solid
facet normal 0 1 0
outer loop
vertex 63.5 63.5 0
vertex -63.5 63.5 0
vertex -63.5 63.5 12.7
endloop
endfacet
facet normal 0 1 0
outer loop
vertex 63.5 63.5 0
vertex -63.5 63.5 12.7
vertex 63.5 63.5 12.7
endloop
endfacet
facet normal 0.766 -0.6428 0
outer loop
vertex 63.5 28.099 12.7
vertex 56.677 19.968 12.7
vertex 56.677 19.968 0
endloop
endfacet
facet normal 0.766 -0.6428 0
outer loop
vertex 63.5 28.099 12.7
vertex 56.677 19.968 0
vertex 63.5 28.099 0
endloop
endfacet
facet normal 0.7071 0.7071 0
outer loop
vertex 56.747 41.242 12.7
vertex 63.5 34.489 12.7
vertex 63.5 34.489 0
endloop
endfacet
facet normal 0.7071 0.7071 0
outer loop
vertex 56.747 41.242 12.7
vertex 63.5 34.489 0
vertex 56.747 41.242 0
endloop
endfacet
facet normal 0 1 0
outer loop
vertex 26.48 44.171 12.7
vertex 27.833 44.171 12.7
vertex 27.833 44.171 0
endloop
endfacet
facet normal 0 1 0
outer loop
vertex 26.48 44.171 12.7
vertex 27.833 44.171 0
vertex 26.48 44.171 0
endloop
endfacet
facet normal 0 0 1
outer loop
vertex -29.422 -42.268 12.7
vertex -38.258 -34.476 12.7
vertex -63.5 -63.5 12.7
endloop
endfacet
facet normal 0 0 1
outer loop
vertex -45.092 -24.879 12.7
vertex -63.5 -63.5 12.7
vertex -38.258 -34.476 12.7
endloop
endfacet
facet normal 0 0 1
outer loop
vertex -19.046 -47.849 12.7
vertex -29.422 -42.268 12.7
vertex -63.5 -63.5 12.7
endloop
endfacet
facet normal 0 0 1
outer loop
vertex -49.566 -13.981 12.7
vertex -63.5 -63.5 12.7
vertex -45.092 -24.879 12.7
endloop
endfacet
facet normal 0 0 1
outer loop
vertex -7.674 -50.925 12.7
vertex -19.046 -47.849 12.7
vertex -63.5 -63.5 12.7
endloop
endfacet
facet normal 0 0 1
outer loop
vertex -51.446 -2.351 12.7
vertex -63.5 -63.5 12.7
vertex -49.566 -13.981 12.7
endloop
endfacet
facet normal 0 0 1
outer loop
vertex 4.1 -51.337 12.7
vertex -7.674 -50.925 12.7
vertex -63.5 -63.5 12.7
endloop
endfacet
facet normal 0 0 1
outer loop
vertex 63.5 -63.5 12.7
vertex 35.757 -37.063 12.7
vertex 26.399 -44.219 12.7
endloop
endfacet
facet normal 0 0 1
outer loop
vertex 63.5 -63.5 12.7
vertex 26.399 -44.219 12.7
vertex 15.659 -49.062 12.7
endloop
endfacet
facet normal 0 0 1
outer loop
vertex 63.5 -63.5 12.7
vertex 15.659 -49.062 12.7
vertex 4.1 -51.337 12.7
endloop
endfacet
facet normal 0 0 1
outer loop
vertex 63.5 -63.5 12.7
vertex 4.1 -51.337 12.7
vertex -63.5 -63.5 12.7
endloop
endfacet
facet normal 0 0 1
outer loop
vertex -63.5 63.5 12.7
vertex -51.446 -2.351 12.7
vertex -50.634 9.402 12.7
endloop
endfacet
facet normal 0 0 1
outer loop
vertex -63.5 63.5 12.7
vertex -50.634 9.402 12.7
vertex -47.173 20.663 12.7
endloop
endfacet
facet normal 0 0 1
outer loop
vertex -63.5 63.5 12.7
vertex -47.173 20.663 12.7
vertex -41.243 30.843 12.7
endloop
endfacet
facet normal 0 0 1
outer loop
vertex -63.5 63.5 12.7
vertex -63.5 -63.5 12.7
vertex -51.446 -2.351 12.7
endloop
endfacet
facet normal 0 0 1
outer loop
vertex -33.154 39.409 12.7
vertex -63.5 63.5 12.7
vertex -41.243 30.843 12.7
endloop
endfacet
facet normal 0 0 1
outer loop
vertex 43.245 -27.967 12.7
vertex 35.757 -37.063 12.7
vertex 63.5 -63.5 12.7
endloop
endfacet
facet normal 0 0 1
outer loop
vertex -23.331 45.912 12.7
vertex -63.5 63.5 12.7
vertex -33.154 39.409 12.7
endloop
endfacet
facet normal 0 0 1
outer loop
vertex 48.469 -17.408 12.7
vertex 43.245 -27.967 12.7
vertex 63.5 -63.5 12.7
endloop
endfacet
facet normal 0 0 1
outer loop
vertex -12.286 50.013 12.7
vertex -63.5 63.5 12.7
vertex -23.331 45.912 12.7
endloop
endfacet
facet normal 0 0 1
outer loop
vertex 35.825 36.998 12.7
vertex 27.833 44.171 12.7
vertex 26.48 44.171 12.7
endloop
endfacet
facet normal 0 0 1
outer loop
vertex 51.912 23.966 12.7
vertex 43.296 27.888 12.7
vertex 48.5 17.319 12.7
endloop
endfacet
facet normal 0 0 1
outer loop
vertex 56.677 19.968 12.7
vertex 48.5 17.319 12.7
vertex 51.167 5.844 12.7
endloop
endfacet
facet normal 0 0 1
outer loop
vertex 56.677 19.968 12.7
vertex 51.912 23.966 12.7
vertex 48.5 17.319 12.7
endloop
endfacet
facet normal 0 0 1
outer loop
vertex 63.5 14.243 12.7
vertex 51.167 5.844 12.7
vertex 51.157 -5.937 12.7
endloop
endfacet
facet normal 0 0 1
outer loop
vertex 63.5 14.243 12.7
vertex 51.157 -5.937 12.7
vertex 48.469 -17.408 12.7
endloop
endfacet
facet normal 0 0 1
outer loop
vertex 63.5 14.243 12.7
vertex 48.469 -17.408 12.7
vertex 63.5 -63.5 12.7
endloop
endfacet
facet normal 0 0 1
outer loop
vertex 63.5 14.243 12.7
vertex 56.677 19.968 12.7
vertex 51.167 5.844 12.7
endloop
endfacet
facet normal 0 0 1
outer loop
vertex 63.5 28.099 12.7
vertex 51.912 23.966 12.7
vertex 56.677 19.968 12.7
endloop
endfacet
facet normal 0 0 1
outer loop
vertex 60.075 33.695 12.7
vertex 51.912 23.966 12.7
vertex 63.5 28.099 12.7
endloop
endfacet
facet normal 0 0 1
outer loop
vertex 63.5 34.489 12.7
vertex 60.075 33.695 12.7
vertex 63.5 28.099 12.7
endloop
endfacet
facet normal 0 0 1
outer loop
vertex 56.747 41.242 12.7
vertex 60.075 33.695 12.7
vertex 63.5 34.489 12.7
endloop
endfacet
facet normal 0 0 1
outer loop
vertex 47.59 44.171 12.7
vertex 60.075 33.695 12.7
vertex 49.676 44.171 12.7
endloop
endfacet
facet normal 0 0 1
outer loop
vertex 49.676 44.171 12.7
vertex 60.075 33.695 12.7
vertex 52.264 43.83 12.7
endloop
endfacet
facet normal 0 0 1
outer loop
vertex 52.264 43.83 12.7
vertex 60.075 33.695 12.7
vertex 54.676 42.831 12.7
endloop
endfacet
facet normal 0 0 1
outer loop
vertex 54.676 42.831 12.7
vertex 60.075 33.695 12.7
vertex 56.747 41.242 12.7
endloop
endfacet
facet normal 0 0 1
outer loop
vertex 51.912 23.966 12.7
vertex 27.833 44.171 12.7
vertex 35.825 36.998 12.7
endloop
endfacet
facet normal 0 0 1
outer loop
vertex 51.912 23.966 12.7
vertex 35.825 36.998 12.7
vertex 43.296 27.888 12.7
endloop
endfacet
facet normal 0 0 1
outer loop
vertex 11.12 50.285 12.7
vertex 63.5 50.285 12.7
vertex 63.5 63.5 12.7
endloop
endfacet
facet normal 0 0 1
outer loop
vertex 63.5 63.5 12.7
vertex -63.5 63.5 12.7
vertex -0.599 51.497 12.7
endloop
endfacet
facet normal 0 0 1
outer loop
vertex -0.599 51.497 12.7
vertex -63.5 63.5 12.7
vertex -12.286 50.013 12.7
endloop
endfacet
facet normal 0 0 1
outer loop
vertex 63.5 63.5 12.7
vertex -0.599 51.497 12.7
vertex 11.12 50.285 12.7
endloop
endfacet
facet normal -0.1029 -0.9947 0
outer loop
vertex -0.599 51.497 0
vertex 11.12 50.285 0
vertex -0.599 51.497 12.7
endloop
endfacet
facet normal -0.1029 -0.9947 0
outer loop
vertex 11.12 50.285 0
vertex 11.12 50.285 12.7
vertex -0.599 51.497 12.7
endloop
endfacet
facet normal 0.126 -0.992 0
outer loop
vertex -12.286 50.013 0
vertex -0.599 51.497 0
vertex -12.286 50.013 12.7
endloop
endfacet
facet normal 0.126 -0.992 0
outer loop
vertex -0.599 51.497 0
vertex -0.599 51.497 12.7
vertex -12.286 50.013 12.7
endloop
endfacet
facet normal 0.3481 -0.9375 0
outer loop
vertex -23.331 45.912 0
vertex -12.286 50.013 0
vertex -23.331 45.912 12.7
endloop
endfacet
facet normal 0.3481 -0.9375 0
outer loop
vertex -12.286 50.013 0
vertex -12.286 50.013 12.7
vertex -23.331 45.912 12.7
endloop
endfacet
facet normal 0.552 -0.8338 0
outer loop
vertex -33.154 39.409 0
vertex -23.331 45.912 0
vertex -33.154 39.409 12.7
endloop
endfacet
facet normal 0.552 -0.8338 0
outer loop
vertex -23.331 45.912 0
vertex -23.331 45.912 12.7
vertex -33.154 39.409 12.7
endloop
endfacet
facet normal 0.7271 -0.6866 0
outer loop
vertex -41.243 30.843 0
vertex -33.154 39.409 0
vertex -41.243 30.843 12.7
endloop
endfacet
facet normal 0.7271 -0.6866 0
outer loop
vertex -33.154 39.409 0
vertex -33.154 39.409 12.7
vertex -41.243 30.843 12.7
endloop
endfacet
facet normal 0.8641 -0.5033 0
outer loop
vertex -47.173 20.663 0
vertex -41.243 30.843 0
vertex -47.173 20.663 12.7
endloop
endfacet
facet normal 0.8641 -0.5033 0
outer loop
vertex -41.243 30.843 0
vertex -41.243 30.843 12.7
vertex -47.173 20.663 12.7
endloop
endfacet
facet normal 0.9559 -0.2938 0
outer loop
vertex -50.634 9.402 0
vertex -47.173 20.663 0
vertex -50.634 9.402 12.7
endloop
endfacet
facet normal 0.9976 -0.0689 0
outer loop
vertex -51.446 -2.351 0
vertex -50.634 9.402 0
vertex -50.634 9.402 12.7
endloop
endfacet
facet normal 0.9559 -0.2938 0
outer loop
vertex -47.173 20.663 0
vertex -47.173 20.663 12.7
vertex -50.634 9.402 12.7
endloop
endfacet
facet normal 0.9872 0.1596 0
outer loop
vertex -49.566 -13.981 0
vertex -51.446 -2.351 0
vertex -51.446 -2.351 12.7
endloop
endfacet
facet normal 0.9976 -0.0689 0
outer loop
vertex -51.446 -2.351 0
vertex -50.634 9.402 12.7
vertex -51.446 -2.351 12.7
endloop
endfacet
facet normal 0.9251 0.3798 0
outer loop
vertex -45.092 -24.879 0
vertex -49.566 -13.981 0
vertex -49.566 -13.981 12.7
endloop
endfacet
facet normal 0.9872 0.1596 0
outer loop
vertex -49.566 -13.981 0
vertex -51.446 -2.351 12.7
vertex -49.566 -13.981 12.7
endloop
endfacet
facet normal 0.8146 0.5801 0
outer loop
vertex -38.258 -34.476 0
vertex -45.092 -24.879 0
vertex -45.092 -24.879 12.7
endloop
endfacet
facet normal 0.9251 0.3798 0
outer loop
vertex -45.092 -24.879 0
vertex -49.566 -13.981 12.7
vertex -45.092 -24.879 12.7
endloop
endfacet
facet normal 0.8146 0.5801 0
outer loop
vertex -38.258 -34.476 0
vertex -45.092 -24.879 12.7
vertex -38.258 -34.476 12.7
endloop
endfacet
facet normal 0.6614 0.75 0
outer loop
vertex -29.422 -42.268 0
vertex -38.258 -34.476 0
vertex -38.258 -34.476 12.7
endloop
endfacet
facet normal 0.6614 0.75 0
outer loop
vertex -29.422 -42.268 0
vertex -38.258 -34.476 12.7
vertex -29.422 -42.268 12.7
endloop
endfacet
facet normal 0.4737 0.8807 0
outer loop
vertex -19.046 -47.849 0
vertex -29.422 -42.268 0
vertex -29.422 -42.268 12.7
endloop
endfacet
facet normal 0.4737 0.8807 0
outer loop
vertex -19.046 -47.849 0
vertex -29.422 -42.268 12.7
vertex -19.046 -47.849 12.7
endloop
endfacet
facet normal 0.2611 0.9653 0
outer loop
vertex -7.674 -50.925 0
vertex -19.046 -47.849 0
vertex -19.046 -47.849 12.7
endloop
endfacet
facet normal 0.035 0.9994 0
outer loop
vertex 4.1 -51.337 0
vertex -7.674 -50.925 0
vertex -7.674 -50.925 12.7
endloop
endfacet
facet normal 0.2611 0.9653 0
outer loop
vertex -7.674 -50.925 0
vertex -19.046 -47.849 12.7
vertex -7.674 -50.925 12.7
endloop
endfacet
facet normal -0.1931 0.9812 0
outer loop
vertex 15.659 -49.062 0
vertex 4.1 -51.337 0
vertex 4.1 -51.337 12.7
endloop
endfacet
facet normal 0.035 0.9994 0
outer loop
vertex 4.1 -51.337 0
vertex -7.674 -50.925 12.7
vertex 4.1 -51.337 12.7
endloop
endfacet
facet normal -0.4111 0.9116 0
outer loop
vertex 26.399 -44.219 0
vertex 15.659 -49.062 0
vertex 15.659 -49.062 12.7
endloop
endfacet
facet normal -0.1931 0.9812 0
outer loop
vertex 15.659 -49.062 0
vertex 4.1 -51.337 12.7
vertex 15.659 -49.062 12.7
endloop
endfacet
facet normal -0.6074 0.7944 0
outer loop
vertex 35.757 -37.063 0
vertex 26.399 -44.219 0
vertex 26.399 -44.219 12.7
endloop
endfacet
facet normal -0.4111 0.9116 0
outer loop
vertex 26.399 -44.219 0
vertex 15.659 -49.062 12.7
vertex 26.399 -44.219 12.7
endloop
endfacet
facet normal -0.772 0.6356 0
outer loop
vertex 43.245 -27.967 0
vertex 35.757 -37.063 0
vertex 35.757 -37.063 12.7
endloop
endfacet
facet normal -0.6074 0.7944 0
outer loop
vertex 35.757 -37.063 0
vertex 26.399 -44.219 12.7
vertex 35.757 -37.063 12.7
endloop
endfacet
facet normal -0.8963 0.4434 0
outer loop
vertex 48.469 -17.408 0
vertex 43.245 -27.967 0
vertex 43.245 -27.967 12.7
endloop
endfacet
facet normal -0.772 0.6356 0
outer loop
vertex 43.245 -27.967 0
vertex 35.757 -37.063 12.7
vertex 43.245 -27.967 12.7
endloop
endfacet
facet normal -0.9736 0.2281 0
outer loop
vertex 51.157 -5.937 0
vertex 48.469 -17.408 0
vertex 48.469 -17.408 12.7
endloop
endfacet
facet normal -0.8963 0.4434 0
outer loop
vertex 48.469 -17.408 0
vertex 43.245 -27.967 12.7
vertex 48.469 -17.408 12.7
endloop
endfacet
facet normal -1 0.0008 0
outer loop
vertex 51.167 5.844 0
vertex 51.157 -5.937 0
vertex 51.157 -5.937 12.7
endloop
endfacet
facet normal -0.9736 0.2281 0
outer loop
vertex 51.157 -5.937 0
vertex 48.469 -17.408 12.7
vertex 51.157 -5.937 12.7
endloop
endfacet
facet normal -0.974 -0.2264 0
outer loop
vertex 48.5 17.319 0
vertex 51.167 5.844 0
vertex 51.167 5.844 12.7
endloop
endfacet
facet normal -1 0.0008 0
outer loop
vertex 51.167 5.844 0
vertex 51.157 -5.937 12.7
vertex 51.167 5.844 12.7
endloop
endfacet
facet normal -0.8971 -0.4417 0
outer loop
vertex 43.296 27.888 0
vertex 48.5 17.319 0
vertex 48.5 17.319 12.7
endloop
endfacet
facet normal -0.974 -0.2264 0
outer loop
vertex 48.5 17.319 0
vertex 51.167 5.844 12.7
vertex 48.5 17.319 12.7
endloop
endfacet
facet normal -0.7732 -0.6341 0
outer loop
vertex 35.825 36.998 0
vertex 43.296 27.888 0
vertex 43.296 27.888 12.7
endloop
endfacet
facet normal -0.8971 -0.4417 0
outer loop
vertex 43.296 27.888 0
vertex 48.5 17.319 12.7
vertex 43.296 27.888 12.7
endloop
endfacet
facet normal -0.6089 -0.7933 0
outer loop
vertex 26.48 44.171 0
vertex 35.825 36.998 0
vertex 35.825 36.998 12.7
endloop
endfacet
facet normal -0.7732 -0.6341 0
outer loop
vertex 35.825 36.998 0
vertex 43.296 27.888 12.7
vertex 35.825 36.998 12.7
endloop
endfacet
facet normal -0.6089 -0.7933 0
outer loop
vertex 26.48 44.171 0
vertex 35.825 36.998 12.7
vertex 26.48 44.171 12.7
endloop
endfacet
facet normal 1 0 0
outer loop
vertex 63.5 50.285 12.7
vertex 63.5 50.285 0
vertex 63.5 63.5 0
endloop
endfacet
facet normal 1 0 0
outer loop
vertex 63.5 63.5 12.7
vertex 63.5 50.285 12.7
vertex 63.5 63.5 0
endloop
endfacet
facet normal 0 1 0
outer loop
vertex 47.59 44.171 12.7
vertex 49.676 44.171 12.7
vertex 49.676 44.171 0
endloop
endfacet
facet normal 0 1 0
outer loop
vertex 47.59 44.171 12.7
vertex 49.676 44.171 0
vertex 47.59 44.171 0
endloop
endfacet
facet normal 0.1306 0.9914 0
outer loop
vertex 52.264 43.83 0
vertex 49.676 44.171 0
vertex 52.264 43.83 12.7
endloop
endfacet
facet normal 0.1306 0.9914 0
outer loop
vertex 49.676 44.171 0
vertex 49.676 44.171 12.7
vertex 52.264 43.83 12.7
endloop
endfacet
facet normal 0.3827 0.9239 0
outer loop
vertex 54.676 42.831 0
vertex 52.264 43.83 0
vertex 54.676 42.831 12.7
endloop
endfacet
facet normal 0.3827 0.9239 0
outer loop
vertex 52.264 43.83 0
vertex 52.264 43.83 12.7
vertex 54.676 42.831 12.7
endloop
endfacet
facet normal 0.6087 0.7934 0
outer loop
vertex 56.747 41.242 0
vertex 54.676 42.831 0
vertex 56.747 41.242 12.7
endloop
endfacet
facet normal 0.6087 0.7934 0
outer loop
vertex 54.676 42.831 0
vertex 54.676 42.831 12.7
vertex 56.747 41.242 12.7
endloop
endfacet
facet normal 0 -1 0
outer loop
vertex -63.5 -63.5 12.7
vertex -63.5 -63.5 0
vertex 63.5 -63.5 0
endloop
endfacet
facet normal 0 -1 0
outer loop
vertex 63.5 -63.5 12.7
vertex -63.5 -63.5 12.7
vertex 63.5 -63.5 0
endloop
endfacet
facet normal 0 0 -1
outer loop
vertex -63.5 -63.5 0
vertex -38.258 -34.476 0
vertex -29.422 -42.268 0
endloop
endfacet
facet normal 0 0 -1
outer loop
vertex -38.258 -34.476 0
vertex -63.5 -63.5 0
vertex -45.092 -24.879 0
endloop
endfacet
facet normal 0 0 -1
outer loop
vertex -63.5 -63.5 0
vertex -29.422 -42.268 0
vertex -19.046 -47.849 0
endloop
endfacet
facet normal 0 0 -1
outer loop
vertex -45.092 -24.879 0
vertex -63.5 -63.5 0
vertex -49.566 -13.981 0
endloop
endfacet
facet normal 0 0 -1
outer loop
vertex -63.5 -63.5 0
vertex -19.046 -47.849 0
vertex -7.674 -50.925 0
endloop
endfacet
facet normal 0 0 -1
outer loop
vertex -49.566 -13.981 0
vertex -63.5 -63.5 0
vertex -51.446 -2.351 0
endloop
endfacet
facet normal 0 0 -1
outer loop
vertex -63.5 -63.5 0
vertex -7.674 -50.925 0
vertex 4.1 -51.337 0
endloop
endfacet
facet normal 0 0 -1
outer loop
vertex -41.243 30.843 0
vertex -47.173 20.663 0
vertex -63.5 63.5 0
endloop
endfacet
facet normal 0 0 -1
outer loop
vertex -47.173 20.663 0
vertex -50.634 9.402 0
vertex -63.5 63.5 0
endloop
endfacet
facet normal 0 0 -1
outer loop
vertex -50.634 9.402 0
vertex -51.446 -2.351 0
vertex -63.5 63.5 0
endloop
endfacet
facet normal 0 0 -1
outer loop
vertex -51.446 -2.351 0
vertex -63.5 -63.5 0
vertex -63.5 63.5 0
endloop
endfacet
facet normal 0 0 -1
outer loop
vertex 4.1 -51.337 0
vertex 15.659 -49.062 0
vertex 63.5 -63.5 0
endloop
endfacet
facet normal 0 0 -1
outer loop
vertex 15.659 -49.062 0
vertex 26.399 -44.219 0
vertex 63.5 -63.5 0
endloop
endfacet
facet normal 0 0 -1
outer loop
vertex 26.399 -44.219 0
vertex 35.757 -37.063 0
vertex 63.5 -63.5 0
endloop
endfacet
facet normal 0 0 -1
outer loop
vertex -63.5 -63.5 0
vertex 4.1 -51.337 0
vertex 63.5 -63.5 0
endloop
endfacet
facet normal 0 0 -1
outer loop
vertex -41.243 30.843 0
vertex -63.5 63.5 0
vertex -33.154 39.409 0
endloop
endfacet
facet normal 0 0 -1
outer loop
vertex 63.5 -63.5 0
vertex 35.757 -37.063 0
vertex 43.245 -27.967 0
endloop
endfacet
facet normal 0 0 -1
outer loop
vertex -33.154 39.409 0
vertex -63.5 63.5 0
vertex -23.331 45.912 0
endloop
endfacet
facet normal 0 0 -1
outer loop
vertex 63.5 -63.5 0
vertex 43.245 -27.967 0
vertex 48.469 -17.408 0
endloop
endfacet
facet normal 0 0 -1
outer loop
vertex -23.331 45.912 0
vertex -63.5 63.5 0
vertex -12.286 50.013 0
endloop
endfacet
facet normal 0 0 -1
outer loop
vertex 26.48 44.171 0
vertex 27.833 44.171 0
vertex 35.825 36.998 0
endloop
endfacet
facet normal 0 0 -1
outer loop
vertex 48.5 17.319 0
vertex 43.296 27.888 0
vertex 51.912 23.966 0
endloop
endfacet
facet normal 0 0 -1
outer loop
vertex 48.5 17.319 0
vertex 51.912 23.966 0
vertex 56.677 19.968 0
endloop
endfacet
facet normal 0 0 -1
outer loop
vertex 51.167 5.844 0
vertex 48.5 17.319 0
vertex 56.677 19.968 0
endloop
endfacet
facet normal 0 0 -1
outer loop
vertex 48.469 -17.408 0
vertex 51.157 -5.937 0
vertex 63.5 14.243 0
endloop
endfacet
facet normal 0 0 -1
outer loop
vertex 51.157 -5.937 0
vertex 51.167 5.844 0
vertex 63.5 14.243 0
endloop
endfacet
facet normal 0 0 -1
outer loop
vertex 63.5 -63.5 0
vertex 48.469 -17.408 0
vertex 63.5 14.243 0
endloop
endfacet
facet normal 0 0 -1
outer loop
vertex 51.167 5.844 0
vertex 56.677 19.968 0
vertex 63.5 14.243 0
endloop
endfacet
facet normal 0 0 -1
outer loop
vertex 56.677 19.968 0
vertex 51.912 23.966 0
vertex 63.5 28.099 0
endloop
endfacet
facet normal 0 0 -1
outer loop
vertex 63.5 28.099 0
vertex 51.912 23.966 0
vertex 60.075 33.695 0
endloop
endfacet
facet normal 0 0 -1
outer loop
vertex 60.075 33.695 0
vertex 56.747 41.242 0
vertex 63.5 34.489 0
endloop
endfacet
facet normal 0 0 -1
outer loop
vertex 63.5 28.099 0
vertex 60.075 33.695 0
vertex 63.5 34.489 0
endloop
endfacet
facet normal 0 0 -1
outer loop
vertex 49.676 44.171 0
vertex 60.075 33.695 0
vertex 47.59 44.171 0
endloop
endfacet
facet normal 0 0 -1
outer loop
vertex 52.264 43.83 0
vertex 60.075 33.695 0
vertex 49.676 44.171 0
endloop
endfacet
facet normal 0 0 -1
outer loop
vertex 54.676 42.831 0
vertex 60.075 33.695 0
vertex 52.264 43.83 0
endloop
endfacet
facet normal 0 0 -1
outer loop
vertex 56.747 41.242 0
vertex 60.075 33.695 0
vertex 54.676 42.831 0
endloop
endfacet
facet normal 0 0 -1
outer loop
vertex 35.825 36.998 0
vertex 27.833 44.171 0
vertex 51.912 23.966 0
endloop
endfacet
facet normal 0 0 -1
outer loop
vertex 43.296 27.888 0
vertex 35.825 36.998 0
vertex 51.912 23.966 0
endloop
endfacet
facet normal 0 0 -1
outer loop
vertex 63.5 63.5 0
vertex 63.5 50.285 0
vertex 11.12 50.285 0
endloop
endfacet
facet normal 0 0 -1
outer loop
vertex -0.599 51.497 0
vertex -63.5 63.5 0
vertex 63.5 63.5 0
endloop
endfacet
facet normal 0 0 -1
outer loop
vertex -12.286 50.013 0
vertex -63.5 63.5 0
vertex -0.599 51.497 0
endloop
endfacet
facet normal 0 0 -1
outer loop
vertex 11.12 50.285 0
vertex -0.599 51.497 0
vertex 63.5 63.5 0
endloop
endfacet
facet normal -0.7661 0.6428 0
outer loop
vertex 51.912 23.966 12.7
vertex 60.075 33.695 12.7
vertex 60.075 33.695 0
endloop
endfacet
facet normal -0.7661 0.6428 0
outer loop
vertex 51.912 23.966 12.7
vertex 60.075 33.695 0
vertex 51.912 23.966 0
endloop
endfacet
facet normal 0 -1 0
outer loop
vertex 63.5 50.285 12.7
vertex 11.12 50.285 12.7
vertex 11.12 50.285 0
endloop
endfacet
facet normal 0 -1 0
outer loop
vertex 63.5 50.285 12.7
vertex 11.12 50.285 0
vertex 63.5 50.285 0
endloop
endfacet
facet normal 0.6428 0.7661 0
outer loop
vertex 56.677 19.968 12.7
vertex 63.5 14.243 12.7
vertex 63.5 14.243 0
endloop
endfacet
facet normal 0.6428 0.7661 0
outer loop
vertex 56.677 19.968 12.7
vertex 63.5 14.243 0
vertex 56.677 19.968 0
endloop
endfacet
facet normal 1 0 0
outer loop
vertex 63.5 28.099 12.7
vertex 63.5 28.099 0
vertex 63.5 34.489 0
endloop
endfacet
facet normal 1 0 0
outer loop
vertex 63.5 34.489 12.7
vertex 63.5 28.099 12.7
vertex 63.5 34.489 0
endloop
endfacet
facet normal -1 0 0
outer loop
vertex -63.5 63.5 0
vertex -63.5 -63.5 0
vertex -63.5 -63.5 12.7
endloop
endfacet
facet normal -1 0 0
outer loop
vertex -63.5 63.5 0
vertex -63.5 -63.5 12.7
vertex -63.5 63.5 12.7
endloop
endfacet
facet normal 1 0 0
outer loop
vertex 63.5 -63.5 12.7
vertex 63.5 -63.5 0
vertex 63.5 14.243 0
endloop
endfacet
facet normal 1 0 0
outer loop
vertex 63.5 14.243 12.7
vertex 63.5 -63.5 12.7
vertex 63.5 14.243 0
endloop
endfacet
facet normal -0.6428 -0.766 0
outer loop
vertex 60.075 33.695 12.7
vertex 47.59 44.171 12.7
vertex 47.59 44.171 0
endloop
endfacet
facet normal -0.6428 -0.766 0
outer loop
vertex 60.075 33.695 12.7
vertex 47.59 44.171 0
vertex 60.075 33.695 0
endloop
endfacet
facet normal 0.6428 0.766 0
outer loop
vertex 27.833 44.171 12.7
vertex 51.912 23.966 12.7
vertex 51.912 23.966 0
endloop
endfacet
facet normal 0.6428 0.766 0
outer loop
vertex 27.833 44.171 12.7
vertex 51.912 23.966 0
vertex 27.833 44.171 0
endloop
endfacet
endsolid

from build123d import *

# Parameters (mm, degrees)
SKETCH1_W           = 127
SKETCH1_H           = 127
BOSS_EXTRUDE1_DEPTH = 12.7
CUT_EXTRUDE1_REACH  = 92.696
SKETCH2_R           = 51.5
CUT_EXTRUDE2_REACH  = 92.696
CUT_EXTRUDE3_REACH  = 92.696
CUT_EXTRUDE4_DEPTH  = 91.696141042
FILLET1_R           = 10


with BuildPart() as part:
    # Sketch1 → Boss-Extrude1 (new body)
    with BuildSketch(Plane.XY):
        Rectangle(SKETCH1_W, SKETCH1_H)
    extrude(amount=BOSS_EXTRUDE1_DEPTH)

    # Sketch2 → Cut-Extrude1 (cut, up to next)
    with BuildSketch(Plane.XY.offset(12.7), mode=Mode.PRIVATE) as cut_extrude1_sk1:
        Circle(SKETCH2_R)
    cut_extrude1_tool1 = extrude(cut_extrude1_sk1.sketch, amount=-CUT_EXTRUDE1_REACH, mode=Mode.PRIVATE) & part.part
    add(cut_extrude1_tool1.solids().sort_by_distance((0, 0, 12.7))[0], mode=Mode.SUBTRACT)

    # Sketch3 → Cut-Extrude2 (cut, up to next)
    with BuildSketch(Plane.XY.offset(12.7), mode=Mode.PRIVATE) as cut_extrude2_sk1:
        Polygon((0, 50.285247175), (63.5, 50.285247175), (63.5, 34.489292445), (48.70404527, 49.285247175), (0, 49.285247175), align=None)
    cut_extrude2_tool1 = extrude(cut_extrude2_sk1.sketch, amount=-CUT_EXTRUDE2_REACH, mode=Mode.PRIVATE) & part.part
    add(cut_extrude2_tool1.solids().sort_by_distance((31.75, 49.630895, 12.7))[0], mode=Mode.SUBTRACT)

    # Sketch4 → Cut-Extrude3 (cut, up to next)
    with BuildSketch(Plane.XY.offset(12.7), mode=Mode.PRIVATE) as cut_extrude3_sk1:
        Polygon((41.495660788, 49.285247175), (60.075181823, 33.695177927), (51.91177918, 23.9664135), (21.737968187, 49.285247175), align=None)
    cut_extrude3_tool1 = extrude(cut_extrude3_sk1.sketch, amount=-CUT_EXTRUDE3_REACH, mode=Mode.PRIVATE) & part.part
    # Sketch4 → Cut-Extrude3 (cut, up to next)
    with BuildSketch(Plane.XY.offset(12.7), mode=Mode.PRIVATE) as cut_extrude3_sk2:
        Polygon((56.676941472, 19.967967578), (63.5, 28.099372092), (63.5, 14.242741684), align=None)
    cut_extrude3_tool2 = extrude(cut_extrude3_sk2.sketch, amount=-CUT_EXTRUDE3_REACH, mode=Mode.PRIVATE) & part.part
    add(cut_extrude3_tool1.solids().sort_by_distance((43.251809, 38.865217, 12.7))[0], mode=Mode.SUBTRACT)
    add(cut_extrude3_tool2.solids().sort_by_distance((61.225647, 20.770027, 12.7))[0], mode=Mode.SUBTRACT)

    # Sketch5 → Cut-Extrude4 (cut, through all)
    with BuildSketch(Plane.XY.offset(12.7)):
        Polygon((11.794347458, 49.797355322), (57.138646711, 49.797355322), (57.138646711, 44.171093993), (19.361103765, 44.171093993), align=None)
    extrude(amount=-CUT_EXTRUDE4_DEPTH, mode=Mode.SUBTRACT)

    # Fillet1
    fillet1_edges = [part.edges().sort_by_distance(p)[0] for p in [
        (53.818198452, 44.171093993, 6.35),
    ]]
    fillet(fillet1_edges, radius=FILLET1_R)


solid = part.part
